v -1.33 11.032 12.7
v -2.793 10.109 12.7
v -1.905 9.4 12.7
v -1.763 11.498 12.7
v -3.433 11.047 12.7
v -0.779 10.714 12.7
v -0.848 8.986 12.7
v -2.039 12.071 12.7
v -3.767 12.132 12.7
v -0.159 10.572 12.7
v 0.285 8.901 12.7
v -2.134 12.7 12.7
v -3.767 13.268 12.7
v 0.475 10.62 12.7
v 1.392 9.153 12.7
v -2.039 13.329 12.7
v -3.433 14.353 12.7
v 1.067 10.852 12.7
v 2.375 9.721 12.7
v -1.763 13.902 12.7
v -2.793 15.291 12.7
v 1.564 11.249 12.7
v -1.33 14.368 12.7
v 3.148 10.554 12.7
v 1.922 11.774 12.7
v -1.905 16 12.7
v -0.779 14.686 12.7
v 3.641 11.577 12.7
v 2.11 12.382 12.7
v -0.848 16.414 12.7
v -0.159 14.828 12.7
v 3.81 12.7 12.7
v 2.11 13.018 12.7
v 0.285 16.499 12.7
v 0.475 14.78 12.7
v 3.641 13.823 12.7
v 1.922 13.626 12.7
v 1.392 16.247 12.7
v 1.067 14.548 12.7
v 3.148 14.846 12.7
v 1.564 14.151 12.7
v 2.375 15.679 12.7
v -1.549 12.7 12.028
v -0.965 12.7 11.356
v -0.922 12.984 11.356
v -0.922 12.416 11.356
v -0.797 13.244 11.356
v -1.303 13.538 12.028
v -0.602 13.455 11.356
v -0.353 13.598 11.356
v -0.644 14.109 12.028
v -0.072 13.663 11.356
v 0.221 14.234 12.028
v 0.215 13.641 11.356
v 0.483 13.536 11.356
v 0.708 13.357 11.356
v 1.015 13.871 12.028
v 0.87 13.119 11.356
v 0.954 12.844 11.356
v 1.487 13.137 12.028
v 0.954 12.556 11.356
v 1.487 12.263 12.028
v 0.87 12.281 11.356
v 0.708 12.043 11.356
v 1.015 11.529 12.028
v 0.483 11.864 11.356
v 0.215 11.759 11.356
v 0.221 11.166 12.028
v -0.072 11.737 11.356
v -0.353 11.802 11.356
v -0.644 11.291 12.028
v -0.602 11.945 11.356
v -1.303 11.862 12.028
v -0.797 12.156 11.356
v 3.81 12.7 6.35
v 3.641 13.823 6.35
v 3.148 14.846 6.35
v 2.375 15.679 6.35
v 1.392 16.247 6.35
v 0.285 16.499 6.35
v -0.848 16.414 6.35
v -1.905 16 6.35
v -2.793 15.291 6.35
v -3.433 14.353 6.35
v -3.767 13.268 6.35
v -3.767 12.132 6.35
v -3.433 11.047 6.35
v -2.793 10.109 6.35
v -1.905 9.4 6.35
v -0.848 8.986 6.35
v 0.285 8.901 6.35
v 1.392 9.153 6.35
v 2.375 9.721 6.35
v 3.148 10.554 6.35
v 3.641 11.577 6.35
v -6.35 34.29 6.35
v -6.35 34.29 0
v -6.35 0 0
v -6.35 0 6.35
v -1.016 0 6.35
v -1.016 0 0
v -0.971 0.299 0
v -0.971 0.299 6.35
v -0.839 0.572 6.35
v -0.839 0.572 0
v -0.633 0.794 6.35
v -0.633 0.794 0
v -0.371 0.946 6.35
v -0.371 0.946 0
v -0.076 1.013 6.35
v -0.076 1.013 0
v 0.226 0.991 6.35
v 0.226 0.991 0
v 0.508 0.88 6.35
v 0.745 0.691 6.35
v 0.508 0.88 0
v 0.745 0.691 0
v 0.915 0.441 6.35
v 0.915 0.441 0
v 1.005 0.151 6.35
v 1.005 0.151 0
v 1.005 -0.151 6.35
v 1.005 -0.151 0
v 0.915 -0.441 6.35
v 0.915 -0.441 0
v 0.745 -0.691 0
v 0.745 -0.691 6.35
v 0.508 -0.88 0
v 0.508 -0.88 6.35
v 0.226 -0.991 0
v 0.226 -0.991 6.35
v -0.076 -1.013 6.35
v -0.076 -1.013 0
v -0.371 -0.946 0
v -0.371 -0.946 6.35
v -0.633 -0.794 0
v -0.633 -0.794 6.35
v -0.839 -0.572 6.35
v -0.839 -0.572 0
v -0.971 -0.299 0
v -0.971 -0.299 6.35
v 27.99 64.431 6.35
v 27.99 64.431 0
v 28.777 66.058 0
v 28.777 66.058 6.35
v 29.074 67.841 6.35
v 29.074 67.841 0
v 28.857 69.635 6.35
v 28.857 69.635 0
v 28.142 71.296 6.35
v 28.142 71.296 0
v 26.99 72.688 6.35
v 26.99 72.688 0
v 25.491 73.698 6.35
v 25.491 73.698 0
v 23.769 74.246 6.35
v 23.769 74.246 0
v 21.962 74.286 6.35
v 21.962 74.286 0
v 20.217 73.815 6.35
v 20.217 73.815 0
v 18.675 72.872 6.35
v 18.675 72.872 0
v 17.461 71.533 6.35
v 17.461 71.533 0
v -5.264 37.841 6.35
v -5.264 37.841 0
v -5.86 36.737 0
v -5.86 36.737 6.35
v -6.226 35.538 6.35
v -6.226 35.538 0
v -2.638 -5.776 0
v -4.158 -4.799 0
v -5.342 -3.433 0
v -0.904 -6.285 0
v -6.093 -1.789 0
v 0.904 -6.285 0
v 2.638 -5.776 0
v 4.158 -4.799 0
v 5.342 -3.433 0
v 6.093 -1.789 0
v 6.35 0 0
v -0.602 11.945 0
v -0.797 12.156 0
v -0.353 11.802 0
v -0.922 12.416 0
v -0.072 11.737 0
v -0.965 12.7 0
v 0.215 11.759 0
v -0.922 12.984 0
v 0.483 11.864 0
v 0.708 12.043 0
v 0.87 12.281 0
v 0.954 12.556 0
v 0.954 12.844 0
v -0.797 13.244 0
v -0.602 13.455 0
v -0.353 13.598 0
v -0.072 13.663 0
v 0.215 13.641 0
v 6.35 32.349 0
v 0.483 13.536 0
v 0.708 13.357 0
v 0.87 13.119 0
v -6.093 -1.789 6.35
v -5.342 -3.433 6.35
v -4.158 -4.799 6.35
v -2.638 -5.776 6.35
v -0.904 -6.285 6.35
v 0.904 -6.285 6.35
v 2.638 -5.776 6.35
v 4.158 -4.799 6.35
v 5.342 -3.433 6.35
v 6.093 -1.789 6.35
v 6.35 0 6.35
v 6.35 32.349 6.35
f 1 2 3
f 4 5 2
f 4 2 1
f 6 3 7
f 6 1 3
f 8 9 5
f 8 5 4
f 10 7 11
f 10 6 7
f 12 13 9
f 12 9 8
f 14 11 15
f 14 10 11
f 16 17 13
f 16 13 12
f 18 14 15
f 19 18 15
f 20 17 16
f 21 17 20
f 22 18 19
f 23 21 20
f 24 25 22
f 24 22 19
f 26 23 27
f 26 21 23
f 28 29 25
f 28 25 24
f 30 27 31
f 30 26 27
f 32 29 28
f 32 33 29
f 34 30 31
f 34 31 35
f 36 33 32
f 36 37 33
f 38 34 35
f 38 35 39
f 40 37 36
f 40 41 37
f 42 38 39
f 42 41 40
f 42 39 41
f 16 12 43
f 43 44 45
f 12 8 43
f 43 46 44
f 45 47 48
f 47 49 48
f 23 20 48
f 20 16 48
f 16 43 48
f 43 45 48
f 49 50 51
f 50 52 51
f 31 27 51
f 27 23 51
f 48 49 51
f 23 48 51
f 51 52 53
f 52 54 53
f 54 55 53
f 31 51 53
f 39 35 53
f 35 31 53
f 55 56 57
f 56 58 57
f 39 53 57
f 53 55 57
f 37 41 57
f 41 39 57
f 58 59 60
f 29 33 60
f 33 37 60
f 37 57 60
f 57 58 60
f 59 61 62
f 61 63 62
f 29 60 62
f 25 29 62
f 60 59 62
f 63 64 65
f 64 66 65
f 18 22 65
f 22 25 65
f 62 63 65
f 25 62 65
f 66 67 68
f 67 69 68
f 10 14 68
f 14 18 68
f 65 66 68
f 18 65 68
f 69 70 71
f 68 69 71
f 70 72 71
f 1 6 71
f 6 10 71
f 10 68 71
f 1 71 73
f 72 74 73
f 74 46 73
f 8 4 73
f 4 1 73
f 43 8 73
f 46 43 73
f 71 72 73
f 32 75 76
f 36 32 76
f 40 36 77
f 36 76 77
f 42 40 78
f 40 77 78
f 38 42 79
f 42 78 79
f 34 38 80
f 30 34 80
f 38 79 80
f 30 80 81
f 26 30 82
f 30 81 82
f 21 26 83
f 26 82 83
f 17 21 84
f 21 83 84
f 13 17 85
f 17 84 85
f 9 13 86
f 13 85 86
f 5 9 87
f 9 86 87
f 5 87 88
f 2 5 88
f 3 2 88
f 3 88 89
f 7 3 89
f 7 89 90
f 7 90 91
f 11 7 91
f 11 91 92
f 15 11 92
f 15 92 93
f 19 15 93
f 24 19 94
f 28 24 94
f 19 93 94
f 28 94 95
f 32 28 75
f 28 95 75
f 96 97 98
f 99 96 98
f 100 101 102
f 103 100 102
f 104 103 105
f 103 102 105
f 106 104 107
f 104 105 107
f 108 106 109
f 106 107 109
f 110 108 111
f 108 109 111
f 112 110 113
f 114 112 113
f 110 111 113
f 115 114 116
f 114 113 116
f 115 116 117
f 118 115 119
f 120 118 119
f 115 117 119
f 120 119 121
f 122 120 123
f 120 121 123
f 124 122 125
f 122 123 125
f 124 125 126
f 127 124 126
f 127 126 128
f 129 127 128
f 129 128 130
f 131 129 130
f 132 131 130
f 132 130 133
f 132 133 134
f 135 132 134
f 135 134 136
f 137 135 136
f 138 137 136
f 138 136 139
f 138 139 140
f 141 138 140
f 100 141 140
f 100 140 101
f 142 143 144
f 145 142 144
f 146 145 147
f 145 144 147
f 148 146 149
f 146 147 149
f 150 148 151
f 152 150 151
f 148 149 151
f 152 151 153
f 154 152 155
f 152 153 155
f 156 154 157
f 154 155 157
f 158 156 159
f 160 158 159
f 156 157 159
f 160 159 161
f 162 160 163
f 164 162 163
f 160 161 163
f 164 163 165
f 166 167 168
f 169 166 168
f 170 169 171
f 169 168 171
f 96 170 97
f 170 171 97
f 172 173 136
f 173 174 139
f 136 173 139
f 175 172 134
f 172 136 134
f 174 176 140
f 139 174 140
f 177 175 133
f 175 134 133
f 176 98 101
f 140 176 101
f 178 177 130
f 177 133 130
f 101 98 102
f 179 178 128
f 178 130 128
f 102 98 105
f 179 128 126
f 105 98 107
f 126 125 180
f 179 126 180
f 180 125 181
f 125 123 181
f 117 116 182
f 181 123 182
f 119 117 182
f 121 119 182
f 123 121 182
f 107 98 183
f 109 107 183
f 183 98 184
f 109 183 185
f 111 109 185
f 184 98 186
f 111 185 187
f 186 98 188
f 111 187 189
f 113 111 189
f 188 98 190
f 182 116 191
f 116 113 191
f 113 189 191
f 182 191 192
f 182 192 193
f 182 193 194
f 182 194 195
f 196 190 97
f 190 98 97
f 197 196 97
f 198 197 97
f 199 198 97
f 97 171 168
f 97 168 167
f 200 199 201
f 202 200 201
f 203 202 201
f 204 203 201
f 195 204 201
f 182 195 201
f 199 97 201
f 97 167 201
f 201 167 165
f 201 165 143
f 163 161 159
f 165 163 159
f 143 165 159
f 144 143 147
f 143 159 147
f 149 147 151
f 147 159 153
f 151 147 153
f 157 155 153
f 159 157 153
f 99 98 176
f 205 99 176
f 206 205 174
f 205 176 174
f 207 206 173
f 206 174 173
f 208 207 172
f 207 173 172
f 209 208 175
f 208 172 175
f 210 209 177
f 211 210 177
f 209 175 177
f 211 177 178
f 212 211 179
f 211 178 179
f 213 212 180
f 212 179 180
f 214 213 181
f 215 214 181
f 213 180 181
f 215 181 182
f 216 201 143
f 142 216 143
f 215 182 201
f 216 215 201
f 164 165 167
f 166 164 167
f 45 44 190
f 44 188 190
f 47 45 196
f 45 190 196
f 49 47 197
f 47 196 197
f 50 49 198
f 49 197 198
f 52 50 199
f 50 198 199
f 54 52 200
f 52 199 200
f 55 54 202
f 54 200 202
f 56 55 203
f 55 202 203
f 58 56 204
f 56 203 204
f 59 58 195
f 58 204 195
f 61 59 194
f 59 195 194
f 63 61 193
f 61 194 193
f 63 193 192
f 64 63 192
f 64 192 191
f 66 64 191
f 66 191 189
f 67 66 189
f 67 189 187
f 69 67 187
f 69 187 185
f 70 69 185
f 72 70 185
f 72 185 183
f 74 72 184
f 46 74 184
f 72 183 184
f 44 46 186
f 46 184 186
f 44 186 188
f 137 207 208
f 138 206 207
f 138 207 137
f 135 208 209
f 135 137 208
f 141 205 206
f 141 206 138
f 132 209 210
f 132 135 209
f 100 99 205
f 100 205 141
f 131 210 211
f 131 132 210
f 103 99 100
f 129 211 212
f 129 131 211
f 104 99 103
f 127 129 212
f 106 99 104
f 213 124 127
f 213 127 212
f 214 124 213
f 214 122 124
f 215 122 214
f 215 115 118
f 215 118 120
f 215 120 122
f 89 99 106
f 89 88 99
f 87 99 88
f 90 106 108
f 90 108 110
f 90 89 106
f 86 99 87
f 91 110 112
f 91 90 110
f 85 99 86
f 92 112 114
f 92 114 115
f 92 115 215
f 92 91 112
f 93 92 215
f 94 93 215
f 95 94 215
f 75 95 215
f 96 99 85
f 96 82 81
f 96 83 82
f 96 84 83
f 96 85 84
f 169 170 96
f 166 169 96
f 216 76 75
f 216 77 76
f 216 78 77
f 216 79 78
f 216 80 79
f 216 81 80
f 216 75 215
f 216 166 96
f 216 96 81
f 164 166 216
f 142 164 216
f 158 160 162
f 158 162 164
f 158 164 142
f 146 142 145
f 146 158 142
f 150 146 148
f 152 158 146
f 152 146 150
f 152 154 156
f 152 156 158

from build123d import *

# Parameters (mm, degrees)
F1_DEPTH       = 6.35
F2_R           = 3.81
F3_DEPTH       = 6.35
F5_D           = 1.9304
F5_CSINK_D     = 4.2672
F5_CSINK_ANGLE = 82
F7_D           = 2.032


with BuildPart() as f1:
    # F0 (on Top) → F1 (new body)
    with BuildSketch(Plane.XY):
        with BuildLine():
            Line((-6.35, 34.29), (-6.35, 12.7))
            ThreePointArc((-6.35, 12.7), (-4.4901280605, 17.1901280605), (0, 19.05))
            Line((0, 19.05), (0, 27.94))
            ThreePointArc((0, 27.94), (-4.4901280605, 29.7998719395), (-6.35, 34.29))
        make_face()
        with BuildLine():
            ThreePointArc((0, 19.05), (4.4901280605, 17.1901280605), (6.35, 12.7))
            Line((6.35, 12.7), (6.35, 32.3486101727))
            Line((6.35, 32.3486101727), (5.2643885857, 30.739125063))
            ThreePointArc((5.2643885857, 30.739125063), (2.9811444237, 28.6832827853), (0, 27.94))
            Line((0, 27.94), (0, 19.05))
        make_face()
        with BuildLine():
            ThreePointArc((-5.2643885857, 37.840874937), (-6.0725352004, 36.146560325), (-6.35, 34.29))
            ThreePointArc((-6.35, 34.29), (-4.4901280605, 29.7998719395), (0, 27.94))
            Line((0, 27.94), (0, 34.29))
            Line((0, 34.29), (3.550874937, 39.5543885857))
            ThreePointArc((3.550874937, 39.5543885857), (-1.2116371206, 40.5233326149), (-5.2643885857, 37.840874937))
        make_face()
        with BuildLine():
            Line((5.2643885857, 30.739125063), (6.35, 32.3486101727))
            Line((6.35, 32.3486101727), (6.35, 34.29))
            ThreePointArc((6.35, 34.29), (5.6067172147, 37.2711444237), (3.550874937, 39.5543885857))
            Line((3.550874937, 39.5543885857), (0, 34.29))
            Line((0, 34.29), (0, 27.94))
            ThreePointArc((0, 27.94), (2.9811444237, 28.6832827853), (5.2643885857, 30.739125063))
        make_face()
        with BuildLine():
            Line((6.35, 34.29), (6.35, 32.3486101727))
            Line((6.35, 32.3486101727), (27.9899881828, 64.4312120116))
            ThreePointArc((27.9899881828, 64.4312120116), (26.2764745341, 73.2464755344), (17.4612110113, 71.5329618857))
            Line((17.4612110113, 71.5329618857), (-5.2643885857, 37.840874937))
            ThreePointArc((-5.2643885857, 37.840874937), (-1.2116371206, 40.5233326149), (3.550874937, 39.5543885857))
            ThreePointArc((3.550874937, 39.5543885857), (5.6067172147, 37.2711444237), (6.35, 34.29))
        make_face()
        with BuildLine():
            Line((0, 12.7), (0, 6.35))
            ThreePointArc((0, 6.35), (4.4901280605, 8.2098719395), (6.35, 12.7))
            ThreePointArc((6.35, 12.7), (4.4901280605, 17.1901280605), (0, 19.05))
            Line((0, 19.05), (0, 12.7))
        make_face()
        with BuildLine():
            ThreePointArc((-6.35, 12.7), (-4.4901280605, 8.2098719395), (0, 6.35))
            Line((0, 6.35), (0, 12.7))
            Line((0, 12.7), (0, 19.05))
            ThreePointArc((0, 19.05), (-4.4901280605, 17.1901280605), (-6.35, 12.7))
        make_face()
        with BuildLine():
            ThreePointArc((6.35, 12.7), (4.4901280605, 8.2098719395), (0, 6.35))
            ThreePointArc((0, 6.35), (-4.4901280605, 8.2098719395), (-6.35, 12.7))
            Line((-6.35, 12.7), (-6.35, 0))
            ThreePointArc((-6.35, 0), (0, -6.35), (6.35, 0))
            Line((6.35, 0), (6.35, 12.7))
        make_face()
    extrude(amount=F1_DEPTH)

    # F2 (on face) → F3 (join)
    with BuildSketch(Plane.XY.offset(6.35)):
        with Locations((0, 12.7)):
            Circle(F2_R)
    extrude(amount=F3_DEPTH)

    # F5 (through all)
    with Locations(Plane.XY.offset(12.7)):
        with Locations((0, 12.7)):
            CounterSinkHole(F5_D / 2, F5_CSINK_D / 2, counter_sink_angle=F5_CSINK_ANGLE)

    # F7 (through all)
    with Locations(Plane.XY.offset(6.35)):
        with Locations((0, 0)):
            Hole(F7_D / 2)


solid = f1.part
